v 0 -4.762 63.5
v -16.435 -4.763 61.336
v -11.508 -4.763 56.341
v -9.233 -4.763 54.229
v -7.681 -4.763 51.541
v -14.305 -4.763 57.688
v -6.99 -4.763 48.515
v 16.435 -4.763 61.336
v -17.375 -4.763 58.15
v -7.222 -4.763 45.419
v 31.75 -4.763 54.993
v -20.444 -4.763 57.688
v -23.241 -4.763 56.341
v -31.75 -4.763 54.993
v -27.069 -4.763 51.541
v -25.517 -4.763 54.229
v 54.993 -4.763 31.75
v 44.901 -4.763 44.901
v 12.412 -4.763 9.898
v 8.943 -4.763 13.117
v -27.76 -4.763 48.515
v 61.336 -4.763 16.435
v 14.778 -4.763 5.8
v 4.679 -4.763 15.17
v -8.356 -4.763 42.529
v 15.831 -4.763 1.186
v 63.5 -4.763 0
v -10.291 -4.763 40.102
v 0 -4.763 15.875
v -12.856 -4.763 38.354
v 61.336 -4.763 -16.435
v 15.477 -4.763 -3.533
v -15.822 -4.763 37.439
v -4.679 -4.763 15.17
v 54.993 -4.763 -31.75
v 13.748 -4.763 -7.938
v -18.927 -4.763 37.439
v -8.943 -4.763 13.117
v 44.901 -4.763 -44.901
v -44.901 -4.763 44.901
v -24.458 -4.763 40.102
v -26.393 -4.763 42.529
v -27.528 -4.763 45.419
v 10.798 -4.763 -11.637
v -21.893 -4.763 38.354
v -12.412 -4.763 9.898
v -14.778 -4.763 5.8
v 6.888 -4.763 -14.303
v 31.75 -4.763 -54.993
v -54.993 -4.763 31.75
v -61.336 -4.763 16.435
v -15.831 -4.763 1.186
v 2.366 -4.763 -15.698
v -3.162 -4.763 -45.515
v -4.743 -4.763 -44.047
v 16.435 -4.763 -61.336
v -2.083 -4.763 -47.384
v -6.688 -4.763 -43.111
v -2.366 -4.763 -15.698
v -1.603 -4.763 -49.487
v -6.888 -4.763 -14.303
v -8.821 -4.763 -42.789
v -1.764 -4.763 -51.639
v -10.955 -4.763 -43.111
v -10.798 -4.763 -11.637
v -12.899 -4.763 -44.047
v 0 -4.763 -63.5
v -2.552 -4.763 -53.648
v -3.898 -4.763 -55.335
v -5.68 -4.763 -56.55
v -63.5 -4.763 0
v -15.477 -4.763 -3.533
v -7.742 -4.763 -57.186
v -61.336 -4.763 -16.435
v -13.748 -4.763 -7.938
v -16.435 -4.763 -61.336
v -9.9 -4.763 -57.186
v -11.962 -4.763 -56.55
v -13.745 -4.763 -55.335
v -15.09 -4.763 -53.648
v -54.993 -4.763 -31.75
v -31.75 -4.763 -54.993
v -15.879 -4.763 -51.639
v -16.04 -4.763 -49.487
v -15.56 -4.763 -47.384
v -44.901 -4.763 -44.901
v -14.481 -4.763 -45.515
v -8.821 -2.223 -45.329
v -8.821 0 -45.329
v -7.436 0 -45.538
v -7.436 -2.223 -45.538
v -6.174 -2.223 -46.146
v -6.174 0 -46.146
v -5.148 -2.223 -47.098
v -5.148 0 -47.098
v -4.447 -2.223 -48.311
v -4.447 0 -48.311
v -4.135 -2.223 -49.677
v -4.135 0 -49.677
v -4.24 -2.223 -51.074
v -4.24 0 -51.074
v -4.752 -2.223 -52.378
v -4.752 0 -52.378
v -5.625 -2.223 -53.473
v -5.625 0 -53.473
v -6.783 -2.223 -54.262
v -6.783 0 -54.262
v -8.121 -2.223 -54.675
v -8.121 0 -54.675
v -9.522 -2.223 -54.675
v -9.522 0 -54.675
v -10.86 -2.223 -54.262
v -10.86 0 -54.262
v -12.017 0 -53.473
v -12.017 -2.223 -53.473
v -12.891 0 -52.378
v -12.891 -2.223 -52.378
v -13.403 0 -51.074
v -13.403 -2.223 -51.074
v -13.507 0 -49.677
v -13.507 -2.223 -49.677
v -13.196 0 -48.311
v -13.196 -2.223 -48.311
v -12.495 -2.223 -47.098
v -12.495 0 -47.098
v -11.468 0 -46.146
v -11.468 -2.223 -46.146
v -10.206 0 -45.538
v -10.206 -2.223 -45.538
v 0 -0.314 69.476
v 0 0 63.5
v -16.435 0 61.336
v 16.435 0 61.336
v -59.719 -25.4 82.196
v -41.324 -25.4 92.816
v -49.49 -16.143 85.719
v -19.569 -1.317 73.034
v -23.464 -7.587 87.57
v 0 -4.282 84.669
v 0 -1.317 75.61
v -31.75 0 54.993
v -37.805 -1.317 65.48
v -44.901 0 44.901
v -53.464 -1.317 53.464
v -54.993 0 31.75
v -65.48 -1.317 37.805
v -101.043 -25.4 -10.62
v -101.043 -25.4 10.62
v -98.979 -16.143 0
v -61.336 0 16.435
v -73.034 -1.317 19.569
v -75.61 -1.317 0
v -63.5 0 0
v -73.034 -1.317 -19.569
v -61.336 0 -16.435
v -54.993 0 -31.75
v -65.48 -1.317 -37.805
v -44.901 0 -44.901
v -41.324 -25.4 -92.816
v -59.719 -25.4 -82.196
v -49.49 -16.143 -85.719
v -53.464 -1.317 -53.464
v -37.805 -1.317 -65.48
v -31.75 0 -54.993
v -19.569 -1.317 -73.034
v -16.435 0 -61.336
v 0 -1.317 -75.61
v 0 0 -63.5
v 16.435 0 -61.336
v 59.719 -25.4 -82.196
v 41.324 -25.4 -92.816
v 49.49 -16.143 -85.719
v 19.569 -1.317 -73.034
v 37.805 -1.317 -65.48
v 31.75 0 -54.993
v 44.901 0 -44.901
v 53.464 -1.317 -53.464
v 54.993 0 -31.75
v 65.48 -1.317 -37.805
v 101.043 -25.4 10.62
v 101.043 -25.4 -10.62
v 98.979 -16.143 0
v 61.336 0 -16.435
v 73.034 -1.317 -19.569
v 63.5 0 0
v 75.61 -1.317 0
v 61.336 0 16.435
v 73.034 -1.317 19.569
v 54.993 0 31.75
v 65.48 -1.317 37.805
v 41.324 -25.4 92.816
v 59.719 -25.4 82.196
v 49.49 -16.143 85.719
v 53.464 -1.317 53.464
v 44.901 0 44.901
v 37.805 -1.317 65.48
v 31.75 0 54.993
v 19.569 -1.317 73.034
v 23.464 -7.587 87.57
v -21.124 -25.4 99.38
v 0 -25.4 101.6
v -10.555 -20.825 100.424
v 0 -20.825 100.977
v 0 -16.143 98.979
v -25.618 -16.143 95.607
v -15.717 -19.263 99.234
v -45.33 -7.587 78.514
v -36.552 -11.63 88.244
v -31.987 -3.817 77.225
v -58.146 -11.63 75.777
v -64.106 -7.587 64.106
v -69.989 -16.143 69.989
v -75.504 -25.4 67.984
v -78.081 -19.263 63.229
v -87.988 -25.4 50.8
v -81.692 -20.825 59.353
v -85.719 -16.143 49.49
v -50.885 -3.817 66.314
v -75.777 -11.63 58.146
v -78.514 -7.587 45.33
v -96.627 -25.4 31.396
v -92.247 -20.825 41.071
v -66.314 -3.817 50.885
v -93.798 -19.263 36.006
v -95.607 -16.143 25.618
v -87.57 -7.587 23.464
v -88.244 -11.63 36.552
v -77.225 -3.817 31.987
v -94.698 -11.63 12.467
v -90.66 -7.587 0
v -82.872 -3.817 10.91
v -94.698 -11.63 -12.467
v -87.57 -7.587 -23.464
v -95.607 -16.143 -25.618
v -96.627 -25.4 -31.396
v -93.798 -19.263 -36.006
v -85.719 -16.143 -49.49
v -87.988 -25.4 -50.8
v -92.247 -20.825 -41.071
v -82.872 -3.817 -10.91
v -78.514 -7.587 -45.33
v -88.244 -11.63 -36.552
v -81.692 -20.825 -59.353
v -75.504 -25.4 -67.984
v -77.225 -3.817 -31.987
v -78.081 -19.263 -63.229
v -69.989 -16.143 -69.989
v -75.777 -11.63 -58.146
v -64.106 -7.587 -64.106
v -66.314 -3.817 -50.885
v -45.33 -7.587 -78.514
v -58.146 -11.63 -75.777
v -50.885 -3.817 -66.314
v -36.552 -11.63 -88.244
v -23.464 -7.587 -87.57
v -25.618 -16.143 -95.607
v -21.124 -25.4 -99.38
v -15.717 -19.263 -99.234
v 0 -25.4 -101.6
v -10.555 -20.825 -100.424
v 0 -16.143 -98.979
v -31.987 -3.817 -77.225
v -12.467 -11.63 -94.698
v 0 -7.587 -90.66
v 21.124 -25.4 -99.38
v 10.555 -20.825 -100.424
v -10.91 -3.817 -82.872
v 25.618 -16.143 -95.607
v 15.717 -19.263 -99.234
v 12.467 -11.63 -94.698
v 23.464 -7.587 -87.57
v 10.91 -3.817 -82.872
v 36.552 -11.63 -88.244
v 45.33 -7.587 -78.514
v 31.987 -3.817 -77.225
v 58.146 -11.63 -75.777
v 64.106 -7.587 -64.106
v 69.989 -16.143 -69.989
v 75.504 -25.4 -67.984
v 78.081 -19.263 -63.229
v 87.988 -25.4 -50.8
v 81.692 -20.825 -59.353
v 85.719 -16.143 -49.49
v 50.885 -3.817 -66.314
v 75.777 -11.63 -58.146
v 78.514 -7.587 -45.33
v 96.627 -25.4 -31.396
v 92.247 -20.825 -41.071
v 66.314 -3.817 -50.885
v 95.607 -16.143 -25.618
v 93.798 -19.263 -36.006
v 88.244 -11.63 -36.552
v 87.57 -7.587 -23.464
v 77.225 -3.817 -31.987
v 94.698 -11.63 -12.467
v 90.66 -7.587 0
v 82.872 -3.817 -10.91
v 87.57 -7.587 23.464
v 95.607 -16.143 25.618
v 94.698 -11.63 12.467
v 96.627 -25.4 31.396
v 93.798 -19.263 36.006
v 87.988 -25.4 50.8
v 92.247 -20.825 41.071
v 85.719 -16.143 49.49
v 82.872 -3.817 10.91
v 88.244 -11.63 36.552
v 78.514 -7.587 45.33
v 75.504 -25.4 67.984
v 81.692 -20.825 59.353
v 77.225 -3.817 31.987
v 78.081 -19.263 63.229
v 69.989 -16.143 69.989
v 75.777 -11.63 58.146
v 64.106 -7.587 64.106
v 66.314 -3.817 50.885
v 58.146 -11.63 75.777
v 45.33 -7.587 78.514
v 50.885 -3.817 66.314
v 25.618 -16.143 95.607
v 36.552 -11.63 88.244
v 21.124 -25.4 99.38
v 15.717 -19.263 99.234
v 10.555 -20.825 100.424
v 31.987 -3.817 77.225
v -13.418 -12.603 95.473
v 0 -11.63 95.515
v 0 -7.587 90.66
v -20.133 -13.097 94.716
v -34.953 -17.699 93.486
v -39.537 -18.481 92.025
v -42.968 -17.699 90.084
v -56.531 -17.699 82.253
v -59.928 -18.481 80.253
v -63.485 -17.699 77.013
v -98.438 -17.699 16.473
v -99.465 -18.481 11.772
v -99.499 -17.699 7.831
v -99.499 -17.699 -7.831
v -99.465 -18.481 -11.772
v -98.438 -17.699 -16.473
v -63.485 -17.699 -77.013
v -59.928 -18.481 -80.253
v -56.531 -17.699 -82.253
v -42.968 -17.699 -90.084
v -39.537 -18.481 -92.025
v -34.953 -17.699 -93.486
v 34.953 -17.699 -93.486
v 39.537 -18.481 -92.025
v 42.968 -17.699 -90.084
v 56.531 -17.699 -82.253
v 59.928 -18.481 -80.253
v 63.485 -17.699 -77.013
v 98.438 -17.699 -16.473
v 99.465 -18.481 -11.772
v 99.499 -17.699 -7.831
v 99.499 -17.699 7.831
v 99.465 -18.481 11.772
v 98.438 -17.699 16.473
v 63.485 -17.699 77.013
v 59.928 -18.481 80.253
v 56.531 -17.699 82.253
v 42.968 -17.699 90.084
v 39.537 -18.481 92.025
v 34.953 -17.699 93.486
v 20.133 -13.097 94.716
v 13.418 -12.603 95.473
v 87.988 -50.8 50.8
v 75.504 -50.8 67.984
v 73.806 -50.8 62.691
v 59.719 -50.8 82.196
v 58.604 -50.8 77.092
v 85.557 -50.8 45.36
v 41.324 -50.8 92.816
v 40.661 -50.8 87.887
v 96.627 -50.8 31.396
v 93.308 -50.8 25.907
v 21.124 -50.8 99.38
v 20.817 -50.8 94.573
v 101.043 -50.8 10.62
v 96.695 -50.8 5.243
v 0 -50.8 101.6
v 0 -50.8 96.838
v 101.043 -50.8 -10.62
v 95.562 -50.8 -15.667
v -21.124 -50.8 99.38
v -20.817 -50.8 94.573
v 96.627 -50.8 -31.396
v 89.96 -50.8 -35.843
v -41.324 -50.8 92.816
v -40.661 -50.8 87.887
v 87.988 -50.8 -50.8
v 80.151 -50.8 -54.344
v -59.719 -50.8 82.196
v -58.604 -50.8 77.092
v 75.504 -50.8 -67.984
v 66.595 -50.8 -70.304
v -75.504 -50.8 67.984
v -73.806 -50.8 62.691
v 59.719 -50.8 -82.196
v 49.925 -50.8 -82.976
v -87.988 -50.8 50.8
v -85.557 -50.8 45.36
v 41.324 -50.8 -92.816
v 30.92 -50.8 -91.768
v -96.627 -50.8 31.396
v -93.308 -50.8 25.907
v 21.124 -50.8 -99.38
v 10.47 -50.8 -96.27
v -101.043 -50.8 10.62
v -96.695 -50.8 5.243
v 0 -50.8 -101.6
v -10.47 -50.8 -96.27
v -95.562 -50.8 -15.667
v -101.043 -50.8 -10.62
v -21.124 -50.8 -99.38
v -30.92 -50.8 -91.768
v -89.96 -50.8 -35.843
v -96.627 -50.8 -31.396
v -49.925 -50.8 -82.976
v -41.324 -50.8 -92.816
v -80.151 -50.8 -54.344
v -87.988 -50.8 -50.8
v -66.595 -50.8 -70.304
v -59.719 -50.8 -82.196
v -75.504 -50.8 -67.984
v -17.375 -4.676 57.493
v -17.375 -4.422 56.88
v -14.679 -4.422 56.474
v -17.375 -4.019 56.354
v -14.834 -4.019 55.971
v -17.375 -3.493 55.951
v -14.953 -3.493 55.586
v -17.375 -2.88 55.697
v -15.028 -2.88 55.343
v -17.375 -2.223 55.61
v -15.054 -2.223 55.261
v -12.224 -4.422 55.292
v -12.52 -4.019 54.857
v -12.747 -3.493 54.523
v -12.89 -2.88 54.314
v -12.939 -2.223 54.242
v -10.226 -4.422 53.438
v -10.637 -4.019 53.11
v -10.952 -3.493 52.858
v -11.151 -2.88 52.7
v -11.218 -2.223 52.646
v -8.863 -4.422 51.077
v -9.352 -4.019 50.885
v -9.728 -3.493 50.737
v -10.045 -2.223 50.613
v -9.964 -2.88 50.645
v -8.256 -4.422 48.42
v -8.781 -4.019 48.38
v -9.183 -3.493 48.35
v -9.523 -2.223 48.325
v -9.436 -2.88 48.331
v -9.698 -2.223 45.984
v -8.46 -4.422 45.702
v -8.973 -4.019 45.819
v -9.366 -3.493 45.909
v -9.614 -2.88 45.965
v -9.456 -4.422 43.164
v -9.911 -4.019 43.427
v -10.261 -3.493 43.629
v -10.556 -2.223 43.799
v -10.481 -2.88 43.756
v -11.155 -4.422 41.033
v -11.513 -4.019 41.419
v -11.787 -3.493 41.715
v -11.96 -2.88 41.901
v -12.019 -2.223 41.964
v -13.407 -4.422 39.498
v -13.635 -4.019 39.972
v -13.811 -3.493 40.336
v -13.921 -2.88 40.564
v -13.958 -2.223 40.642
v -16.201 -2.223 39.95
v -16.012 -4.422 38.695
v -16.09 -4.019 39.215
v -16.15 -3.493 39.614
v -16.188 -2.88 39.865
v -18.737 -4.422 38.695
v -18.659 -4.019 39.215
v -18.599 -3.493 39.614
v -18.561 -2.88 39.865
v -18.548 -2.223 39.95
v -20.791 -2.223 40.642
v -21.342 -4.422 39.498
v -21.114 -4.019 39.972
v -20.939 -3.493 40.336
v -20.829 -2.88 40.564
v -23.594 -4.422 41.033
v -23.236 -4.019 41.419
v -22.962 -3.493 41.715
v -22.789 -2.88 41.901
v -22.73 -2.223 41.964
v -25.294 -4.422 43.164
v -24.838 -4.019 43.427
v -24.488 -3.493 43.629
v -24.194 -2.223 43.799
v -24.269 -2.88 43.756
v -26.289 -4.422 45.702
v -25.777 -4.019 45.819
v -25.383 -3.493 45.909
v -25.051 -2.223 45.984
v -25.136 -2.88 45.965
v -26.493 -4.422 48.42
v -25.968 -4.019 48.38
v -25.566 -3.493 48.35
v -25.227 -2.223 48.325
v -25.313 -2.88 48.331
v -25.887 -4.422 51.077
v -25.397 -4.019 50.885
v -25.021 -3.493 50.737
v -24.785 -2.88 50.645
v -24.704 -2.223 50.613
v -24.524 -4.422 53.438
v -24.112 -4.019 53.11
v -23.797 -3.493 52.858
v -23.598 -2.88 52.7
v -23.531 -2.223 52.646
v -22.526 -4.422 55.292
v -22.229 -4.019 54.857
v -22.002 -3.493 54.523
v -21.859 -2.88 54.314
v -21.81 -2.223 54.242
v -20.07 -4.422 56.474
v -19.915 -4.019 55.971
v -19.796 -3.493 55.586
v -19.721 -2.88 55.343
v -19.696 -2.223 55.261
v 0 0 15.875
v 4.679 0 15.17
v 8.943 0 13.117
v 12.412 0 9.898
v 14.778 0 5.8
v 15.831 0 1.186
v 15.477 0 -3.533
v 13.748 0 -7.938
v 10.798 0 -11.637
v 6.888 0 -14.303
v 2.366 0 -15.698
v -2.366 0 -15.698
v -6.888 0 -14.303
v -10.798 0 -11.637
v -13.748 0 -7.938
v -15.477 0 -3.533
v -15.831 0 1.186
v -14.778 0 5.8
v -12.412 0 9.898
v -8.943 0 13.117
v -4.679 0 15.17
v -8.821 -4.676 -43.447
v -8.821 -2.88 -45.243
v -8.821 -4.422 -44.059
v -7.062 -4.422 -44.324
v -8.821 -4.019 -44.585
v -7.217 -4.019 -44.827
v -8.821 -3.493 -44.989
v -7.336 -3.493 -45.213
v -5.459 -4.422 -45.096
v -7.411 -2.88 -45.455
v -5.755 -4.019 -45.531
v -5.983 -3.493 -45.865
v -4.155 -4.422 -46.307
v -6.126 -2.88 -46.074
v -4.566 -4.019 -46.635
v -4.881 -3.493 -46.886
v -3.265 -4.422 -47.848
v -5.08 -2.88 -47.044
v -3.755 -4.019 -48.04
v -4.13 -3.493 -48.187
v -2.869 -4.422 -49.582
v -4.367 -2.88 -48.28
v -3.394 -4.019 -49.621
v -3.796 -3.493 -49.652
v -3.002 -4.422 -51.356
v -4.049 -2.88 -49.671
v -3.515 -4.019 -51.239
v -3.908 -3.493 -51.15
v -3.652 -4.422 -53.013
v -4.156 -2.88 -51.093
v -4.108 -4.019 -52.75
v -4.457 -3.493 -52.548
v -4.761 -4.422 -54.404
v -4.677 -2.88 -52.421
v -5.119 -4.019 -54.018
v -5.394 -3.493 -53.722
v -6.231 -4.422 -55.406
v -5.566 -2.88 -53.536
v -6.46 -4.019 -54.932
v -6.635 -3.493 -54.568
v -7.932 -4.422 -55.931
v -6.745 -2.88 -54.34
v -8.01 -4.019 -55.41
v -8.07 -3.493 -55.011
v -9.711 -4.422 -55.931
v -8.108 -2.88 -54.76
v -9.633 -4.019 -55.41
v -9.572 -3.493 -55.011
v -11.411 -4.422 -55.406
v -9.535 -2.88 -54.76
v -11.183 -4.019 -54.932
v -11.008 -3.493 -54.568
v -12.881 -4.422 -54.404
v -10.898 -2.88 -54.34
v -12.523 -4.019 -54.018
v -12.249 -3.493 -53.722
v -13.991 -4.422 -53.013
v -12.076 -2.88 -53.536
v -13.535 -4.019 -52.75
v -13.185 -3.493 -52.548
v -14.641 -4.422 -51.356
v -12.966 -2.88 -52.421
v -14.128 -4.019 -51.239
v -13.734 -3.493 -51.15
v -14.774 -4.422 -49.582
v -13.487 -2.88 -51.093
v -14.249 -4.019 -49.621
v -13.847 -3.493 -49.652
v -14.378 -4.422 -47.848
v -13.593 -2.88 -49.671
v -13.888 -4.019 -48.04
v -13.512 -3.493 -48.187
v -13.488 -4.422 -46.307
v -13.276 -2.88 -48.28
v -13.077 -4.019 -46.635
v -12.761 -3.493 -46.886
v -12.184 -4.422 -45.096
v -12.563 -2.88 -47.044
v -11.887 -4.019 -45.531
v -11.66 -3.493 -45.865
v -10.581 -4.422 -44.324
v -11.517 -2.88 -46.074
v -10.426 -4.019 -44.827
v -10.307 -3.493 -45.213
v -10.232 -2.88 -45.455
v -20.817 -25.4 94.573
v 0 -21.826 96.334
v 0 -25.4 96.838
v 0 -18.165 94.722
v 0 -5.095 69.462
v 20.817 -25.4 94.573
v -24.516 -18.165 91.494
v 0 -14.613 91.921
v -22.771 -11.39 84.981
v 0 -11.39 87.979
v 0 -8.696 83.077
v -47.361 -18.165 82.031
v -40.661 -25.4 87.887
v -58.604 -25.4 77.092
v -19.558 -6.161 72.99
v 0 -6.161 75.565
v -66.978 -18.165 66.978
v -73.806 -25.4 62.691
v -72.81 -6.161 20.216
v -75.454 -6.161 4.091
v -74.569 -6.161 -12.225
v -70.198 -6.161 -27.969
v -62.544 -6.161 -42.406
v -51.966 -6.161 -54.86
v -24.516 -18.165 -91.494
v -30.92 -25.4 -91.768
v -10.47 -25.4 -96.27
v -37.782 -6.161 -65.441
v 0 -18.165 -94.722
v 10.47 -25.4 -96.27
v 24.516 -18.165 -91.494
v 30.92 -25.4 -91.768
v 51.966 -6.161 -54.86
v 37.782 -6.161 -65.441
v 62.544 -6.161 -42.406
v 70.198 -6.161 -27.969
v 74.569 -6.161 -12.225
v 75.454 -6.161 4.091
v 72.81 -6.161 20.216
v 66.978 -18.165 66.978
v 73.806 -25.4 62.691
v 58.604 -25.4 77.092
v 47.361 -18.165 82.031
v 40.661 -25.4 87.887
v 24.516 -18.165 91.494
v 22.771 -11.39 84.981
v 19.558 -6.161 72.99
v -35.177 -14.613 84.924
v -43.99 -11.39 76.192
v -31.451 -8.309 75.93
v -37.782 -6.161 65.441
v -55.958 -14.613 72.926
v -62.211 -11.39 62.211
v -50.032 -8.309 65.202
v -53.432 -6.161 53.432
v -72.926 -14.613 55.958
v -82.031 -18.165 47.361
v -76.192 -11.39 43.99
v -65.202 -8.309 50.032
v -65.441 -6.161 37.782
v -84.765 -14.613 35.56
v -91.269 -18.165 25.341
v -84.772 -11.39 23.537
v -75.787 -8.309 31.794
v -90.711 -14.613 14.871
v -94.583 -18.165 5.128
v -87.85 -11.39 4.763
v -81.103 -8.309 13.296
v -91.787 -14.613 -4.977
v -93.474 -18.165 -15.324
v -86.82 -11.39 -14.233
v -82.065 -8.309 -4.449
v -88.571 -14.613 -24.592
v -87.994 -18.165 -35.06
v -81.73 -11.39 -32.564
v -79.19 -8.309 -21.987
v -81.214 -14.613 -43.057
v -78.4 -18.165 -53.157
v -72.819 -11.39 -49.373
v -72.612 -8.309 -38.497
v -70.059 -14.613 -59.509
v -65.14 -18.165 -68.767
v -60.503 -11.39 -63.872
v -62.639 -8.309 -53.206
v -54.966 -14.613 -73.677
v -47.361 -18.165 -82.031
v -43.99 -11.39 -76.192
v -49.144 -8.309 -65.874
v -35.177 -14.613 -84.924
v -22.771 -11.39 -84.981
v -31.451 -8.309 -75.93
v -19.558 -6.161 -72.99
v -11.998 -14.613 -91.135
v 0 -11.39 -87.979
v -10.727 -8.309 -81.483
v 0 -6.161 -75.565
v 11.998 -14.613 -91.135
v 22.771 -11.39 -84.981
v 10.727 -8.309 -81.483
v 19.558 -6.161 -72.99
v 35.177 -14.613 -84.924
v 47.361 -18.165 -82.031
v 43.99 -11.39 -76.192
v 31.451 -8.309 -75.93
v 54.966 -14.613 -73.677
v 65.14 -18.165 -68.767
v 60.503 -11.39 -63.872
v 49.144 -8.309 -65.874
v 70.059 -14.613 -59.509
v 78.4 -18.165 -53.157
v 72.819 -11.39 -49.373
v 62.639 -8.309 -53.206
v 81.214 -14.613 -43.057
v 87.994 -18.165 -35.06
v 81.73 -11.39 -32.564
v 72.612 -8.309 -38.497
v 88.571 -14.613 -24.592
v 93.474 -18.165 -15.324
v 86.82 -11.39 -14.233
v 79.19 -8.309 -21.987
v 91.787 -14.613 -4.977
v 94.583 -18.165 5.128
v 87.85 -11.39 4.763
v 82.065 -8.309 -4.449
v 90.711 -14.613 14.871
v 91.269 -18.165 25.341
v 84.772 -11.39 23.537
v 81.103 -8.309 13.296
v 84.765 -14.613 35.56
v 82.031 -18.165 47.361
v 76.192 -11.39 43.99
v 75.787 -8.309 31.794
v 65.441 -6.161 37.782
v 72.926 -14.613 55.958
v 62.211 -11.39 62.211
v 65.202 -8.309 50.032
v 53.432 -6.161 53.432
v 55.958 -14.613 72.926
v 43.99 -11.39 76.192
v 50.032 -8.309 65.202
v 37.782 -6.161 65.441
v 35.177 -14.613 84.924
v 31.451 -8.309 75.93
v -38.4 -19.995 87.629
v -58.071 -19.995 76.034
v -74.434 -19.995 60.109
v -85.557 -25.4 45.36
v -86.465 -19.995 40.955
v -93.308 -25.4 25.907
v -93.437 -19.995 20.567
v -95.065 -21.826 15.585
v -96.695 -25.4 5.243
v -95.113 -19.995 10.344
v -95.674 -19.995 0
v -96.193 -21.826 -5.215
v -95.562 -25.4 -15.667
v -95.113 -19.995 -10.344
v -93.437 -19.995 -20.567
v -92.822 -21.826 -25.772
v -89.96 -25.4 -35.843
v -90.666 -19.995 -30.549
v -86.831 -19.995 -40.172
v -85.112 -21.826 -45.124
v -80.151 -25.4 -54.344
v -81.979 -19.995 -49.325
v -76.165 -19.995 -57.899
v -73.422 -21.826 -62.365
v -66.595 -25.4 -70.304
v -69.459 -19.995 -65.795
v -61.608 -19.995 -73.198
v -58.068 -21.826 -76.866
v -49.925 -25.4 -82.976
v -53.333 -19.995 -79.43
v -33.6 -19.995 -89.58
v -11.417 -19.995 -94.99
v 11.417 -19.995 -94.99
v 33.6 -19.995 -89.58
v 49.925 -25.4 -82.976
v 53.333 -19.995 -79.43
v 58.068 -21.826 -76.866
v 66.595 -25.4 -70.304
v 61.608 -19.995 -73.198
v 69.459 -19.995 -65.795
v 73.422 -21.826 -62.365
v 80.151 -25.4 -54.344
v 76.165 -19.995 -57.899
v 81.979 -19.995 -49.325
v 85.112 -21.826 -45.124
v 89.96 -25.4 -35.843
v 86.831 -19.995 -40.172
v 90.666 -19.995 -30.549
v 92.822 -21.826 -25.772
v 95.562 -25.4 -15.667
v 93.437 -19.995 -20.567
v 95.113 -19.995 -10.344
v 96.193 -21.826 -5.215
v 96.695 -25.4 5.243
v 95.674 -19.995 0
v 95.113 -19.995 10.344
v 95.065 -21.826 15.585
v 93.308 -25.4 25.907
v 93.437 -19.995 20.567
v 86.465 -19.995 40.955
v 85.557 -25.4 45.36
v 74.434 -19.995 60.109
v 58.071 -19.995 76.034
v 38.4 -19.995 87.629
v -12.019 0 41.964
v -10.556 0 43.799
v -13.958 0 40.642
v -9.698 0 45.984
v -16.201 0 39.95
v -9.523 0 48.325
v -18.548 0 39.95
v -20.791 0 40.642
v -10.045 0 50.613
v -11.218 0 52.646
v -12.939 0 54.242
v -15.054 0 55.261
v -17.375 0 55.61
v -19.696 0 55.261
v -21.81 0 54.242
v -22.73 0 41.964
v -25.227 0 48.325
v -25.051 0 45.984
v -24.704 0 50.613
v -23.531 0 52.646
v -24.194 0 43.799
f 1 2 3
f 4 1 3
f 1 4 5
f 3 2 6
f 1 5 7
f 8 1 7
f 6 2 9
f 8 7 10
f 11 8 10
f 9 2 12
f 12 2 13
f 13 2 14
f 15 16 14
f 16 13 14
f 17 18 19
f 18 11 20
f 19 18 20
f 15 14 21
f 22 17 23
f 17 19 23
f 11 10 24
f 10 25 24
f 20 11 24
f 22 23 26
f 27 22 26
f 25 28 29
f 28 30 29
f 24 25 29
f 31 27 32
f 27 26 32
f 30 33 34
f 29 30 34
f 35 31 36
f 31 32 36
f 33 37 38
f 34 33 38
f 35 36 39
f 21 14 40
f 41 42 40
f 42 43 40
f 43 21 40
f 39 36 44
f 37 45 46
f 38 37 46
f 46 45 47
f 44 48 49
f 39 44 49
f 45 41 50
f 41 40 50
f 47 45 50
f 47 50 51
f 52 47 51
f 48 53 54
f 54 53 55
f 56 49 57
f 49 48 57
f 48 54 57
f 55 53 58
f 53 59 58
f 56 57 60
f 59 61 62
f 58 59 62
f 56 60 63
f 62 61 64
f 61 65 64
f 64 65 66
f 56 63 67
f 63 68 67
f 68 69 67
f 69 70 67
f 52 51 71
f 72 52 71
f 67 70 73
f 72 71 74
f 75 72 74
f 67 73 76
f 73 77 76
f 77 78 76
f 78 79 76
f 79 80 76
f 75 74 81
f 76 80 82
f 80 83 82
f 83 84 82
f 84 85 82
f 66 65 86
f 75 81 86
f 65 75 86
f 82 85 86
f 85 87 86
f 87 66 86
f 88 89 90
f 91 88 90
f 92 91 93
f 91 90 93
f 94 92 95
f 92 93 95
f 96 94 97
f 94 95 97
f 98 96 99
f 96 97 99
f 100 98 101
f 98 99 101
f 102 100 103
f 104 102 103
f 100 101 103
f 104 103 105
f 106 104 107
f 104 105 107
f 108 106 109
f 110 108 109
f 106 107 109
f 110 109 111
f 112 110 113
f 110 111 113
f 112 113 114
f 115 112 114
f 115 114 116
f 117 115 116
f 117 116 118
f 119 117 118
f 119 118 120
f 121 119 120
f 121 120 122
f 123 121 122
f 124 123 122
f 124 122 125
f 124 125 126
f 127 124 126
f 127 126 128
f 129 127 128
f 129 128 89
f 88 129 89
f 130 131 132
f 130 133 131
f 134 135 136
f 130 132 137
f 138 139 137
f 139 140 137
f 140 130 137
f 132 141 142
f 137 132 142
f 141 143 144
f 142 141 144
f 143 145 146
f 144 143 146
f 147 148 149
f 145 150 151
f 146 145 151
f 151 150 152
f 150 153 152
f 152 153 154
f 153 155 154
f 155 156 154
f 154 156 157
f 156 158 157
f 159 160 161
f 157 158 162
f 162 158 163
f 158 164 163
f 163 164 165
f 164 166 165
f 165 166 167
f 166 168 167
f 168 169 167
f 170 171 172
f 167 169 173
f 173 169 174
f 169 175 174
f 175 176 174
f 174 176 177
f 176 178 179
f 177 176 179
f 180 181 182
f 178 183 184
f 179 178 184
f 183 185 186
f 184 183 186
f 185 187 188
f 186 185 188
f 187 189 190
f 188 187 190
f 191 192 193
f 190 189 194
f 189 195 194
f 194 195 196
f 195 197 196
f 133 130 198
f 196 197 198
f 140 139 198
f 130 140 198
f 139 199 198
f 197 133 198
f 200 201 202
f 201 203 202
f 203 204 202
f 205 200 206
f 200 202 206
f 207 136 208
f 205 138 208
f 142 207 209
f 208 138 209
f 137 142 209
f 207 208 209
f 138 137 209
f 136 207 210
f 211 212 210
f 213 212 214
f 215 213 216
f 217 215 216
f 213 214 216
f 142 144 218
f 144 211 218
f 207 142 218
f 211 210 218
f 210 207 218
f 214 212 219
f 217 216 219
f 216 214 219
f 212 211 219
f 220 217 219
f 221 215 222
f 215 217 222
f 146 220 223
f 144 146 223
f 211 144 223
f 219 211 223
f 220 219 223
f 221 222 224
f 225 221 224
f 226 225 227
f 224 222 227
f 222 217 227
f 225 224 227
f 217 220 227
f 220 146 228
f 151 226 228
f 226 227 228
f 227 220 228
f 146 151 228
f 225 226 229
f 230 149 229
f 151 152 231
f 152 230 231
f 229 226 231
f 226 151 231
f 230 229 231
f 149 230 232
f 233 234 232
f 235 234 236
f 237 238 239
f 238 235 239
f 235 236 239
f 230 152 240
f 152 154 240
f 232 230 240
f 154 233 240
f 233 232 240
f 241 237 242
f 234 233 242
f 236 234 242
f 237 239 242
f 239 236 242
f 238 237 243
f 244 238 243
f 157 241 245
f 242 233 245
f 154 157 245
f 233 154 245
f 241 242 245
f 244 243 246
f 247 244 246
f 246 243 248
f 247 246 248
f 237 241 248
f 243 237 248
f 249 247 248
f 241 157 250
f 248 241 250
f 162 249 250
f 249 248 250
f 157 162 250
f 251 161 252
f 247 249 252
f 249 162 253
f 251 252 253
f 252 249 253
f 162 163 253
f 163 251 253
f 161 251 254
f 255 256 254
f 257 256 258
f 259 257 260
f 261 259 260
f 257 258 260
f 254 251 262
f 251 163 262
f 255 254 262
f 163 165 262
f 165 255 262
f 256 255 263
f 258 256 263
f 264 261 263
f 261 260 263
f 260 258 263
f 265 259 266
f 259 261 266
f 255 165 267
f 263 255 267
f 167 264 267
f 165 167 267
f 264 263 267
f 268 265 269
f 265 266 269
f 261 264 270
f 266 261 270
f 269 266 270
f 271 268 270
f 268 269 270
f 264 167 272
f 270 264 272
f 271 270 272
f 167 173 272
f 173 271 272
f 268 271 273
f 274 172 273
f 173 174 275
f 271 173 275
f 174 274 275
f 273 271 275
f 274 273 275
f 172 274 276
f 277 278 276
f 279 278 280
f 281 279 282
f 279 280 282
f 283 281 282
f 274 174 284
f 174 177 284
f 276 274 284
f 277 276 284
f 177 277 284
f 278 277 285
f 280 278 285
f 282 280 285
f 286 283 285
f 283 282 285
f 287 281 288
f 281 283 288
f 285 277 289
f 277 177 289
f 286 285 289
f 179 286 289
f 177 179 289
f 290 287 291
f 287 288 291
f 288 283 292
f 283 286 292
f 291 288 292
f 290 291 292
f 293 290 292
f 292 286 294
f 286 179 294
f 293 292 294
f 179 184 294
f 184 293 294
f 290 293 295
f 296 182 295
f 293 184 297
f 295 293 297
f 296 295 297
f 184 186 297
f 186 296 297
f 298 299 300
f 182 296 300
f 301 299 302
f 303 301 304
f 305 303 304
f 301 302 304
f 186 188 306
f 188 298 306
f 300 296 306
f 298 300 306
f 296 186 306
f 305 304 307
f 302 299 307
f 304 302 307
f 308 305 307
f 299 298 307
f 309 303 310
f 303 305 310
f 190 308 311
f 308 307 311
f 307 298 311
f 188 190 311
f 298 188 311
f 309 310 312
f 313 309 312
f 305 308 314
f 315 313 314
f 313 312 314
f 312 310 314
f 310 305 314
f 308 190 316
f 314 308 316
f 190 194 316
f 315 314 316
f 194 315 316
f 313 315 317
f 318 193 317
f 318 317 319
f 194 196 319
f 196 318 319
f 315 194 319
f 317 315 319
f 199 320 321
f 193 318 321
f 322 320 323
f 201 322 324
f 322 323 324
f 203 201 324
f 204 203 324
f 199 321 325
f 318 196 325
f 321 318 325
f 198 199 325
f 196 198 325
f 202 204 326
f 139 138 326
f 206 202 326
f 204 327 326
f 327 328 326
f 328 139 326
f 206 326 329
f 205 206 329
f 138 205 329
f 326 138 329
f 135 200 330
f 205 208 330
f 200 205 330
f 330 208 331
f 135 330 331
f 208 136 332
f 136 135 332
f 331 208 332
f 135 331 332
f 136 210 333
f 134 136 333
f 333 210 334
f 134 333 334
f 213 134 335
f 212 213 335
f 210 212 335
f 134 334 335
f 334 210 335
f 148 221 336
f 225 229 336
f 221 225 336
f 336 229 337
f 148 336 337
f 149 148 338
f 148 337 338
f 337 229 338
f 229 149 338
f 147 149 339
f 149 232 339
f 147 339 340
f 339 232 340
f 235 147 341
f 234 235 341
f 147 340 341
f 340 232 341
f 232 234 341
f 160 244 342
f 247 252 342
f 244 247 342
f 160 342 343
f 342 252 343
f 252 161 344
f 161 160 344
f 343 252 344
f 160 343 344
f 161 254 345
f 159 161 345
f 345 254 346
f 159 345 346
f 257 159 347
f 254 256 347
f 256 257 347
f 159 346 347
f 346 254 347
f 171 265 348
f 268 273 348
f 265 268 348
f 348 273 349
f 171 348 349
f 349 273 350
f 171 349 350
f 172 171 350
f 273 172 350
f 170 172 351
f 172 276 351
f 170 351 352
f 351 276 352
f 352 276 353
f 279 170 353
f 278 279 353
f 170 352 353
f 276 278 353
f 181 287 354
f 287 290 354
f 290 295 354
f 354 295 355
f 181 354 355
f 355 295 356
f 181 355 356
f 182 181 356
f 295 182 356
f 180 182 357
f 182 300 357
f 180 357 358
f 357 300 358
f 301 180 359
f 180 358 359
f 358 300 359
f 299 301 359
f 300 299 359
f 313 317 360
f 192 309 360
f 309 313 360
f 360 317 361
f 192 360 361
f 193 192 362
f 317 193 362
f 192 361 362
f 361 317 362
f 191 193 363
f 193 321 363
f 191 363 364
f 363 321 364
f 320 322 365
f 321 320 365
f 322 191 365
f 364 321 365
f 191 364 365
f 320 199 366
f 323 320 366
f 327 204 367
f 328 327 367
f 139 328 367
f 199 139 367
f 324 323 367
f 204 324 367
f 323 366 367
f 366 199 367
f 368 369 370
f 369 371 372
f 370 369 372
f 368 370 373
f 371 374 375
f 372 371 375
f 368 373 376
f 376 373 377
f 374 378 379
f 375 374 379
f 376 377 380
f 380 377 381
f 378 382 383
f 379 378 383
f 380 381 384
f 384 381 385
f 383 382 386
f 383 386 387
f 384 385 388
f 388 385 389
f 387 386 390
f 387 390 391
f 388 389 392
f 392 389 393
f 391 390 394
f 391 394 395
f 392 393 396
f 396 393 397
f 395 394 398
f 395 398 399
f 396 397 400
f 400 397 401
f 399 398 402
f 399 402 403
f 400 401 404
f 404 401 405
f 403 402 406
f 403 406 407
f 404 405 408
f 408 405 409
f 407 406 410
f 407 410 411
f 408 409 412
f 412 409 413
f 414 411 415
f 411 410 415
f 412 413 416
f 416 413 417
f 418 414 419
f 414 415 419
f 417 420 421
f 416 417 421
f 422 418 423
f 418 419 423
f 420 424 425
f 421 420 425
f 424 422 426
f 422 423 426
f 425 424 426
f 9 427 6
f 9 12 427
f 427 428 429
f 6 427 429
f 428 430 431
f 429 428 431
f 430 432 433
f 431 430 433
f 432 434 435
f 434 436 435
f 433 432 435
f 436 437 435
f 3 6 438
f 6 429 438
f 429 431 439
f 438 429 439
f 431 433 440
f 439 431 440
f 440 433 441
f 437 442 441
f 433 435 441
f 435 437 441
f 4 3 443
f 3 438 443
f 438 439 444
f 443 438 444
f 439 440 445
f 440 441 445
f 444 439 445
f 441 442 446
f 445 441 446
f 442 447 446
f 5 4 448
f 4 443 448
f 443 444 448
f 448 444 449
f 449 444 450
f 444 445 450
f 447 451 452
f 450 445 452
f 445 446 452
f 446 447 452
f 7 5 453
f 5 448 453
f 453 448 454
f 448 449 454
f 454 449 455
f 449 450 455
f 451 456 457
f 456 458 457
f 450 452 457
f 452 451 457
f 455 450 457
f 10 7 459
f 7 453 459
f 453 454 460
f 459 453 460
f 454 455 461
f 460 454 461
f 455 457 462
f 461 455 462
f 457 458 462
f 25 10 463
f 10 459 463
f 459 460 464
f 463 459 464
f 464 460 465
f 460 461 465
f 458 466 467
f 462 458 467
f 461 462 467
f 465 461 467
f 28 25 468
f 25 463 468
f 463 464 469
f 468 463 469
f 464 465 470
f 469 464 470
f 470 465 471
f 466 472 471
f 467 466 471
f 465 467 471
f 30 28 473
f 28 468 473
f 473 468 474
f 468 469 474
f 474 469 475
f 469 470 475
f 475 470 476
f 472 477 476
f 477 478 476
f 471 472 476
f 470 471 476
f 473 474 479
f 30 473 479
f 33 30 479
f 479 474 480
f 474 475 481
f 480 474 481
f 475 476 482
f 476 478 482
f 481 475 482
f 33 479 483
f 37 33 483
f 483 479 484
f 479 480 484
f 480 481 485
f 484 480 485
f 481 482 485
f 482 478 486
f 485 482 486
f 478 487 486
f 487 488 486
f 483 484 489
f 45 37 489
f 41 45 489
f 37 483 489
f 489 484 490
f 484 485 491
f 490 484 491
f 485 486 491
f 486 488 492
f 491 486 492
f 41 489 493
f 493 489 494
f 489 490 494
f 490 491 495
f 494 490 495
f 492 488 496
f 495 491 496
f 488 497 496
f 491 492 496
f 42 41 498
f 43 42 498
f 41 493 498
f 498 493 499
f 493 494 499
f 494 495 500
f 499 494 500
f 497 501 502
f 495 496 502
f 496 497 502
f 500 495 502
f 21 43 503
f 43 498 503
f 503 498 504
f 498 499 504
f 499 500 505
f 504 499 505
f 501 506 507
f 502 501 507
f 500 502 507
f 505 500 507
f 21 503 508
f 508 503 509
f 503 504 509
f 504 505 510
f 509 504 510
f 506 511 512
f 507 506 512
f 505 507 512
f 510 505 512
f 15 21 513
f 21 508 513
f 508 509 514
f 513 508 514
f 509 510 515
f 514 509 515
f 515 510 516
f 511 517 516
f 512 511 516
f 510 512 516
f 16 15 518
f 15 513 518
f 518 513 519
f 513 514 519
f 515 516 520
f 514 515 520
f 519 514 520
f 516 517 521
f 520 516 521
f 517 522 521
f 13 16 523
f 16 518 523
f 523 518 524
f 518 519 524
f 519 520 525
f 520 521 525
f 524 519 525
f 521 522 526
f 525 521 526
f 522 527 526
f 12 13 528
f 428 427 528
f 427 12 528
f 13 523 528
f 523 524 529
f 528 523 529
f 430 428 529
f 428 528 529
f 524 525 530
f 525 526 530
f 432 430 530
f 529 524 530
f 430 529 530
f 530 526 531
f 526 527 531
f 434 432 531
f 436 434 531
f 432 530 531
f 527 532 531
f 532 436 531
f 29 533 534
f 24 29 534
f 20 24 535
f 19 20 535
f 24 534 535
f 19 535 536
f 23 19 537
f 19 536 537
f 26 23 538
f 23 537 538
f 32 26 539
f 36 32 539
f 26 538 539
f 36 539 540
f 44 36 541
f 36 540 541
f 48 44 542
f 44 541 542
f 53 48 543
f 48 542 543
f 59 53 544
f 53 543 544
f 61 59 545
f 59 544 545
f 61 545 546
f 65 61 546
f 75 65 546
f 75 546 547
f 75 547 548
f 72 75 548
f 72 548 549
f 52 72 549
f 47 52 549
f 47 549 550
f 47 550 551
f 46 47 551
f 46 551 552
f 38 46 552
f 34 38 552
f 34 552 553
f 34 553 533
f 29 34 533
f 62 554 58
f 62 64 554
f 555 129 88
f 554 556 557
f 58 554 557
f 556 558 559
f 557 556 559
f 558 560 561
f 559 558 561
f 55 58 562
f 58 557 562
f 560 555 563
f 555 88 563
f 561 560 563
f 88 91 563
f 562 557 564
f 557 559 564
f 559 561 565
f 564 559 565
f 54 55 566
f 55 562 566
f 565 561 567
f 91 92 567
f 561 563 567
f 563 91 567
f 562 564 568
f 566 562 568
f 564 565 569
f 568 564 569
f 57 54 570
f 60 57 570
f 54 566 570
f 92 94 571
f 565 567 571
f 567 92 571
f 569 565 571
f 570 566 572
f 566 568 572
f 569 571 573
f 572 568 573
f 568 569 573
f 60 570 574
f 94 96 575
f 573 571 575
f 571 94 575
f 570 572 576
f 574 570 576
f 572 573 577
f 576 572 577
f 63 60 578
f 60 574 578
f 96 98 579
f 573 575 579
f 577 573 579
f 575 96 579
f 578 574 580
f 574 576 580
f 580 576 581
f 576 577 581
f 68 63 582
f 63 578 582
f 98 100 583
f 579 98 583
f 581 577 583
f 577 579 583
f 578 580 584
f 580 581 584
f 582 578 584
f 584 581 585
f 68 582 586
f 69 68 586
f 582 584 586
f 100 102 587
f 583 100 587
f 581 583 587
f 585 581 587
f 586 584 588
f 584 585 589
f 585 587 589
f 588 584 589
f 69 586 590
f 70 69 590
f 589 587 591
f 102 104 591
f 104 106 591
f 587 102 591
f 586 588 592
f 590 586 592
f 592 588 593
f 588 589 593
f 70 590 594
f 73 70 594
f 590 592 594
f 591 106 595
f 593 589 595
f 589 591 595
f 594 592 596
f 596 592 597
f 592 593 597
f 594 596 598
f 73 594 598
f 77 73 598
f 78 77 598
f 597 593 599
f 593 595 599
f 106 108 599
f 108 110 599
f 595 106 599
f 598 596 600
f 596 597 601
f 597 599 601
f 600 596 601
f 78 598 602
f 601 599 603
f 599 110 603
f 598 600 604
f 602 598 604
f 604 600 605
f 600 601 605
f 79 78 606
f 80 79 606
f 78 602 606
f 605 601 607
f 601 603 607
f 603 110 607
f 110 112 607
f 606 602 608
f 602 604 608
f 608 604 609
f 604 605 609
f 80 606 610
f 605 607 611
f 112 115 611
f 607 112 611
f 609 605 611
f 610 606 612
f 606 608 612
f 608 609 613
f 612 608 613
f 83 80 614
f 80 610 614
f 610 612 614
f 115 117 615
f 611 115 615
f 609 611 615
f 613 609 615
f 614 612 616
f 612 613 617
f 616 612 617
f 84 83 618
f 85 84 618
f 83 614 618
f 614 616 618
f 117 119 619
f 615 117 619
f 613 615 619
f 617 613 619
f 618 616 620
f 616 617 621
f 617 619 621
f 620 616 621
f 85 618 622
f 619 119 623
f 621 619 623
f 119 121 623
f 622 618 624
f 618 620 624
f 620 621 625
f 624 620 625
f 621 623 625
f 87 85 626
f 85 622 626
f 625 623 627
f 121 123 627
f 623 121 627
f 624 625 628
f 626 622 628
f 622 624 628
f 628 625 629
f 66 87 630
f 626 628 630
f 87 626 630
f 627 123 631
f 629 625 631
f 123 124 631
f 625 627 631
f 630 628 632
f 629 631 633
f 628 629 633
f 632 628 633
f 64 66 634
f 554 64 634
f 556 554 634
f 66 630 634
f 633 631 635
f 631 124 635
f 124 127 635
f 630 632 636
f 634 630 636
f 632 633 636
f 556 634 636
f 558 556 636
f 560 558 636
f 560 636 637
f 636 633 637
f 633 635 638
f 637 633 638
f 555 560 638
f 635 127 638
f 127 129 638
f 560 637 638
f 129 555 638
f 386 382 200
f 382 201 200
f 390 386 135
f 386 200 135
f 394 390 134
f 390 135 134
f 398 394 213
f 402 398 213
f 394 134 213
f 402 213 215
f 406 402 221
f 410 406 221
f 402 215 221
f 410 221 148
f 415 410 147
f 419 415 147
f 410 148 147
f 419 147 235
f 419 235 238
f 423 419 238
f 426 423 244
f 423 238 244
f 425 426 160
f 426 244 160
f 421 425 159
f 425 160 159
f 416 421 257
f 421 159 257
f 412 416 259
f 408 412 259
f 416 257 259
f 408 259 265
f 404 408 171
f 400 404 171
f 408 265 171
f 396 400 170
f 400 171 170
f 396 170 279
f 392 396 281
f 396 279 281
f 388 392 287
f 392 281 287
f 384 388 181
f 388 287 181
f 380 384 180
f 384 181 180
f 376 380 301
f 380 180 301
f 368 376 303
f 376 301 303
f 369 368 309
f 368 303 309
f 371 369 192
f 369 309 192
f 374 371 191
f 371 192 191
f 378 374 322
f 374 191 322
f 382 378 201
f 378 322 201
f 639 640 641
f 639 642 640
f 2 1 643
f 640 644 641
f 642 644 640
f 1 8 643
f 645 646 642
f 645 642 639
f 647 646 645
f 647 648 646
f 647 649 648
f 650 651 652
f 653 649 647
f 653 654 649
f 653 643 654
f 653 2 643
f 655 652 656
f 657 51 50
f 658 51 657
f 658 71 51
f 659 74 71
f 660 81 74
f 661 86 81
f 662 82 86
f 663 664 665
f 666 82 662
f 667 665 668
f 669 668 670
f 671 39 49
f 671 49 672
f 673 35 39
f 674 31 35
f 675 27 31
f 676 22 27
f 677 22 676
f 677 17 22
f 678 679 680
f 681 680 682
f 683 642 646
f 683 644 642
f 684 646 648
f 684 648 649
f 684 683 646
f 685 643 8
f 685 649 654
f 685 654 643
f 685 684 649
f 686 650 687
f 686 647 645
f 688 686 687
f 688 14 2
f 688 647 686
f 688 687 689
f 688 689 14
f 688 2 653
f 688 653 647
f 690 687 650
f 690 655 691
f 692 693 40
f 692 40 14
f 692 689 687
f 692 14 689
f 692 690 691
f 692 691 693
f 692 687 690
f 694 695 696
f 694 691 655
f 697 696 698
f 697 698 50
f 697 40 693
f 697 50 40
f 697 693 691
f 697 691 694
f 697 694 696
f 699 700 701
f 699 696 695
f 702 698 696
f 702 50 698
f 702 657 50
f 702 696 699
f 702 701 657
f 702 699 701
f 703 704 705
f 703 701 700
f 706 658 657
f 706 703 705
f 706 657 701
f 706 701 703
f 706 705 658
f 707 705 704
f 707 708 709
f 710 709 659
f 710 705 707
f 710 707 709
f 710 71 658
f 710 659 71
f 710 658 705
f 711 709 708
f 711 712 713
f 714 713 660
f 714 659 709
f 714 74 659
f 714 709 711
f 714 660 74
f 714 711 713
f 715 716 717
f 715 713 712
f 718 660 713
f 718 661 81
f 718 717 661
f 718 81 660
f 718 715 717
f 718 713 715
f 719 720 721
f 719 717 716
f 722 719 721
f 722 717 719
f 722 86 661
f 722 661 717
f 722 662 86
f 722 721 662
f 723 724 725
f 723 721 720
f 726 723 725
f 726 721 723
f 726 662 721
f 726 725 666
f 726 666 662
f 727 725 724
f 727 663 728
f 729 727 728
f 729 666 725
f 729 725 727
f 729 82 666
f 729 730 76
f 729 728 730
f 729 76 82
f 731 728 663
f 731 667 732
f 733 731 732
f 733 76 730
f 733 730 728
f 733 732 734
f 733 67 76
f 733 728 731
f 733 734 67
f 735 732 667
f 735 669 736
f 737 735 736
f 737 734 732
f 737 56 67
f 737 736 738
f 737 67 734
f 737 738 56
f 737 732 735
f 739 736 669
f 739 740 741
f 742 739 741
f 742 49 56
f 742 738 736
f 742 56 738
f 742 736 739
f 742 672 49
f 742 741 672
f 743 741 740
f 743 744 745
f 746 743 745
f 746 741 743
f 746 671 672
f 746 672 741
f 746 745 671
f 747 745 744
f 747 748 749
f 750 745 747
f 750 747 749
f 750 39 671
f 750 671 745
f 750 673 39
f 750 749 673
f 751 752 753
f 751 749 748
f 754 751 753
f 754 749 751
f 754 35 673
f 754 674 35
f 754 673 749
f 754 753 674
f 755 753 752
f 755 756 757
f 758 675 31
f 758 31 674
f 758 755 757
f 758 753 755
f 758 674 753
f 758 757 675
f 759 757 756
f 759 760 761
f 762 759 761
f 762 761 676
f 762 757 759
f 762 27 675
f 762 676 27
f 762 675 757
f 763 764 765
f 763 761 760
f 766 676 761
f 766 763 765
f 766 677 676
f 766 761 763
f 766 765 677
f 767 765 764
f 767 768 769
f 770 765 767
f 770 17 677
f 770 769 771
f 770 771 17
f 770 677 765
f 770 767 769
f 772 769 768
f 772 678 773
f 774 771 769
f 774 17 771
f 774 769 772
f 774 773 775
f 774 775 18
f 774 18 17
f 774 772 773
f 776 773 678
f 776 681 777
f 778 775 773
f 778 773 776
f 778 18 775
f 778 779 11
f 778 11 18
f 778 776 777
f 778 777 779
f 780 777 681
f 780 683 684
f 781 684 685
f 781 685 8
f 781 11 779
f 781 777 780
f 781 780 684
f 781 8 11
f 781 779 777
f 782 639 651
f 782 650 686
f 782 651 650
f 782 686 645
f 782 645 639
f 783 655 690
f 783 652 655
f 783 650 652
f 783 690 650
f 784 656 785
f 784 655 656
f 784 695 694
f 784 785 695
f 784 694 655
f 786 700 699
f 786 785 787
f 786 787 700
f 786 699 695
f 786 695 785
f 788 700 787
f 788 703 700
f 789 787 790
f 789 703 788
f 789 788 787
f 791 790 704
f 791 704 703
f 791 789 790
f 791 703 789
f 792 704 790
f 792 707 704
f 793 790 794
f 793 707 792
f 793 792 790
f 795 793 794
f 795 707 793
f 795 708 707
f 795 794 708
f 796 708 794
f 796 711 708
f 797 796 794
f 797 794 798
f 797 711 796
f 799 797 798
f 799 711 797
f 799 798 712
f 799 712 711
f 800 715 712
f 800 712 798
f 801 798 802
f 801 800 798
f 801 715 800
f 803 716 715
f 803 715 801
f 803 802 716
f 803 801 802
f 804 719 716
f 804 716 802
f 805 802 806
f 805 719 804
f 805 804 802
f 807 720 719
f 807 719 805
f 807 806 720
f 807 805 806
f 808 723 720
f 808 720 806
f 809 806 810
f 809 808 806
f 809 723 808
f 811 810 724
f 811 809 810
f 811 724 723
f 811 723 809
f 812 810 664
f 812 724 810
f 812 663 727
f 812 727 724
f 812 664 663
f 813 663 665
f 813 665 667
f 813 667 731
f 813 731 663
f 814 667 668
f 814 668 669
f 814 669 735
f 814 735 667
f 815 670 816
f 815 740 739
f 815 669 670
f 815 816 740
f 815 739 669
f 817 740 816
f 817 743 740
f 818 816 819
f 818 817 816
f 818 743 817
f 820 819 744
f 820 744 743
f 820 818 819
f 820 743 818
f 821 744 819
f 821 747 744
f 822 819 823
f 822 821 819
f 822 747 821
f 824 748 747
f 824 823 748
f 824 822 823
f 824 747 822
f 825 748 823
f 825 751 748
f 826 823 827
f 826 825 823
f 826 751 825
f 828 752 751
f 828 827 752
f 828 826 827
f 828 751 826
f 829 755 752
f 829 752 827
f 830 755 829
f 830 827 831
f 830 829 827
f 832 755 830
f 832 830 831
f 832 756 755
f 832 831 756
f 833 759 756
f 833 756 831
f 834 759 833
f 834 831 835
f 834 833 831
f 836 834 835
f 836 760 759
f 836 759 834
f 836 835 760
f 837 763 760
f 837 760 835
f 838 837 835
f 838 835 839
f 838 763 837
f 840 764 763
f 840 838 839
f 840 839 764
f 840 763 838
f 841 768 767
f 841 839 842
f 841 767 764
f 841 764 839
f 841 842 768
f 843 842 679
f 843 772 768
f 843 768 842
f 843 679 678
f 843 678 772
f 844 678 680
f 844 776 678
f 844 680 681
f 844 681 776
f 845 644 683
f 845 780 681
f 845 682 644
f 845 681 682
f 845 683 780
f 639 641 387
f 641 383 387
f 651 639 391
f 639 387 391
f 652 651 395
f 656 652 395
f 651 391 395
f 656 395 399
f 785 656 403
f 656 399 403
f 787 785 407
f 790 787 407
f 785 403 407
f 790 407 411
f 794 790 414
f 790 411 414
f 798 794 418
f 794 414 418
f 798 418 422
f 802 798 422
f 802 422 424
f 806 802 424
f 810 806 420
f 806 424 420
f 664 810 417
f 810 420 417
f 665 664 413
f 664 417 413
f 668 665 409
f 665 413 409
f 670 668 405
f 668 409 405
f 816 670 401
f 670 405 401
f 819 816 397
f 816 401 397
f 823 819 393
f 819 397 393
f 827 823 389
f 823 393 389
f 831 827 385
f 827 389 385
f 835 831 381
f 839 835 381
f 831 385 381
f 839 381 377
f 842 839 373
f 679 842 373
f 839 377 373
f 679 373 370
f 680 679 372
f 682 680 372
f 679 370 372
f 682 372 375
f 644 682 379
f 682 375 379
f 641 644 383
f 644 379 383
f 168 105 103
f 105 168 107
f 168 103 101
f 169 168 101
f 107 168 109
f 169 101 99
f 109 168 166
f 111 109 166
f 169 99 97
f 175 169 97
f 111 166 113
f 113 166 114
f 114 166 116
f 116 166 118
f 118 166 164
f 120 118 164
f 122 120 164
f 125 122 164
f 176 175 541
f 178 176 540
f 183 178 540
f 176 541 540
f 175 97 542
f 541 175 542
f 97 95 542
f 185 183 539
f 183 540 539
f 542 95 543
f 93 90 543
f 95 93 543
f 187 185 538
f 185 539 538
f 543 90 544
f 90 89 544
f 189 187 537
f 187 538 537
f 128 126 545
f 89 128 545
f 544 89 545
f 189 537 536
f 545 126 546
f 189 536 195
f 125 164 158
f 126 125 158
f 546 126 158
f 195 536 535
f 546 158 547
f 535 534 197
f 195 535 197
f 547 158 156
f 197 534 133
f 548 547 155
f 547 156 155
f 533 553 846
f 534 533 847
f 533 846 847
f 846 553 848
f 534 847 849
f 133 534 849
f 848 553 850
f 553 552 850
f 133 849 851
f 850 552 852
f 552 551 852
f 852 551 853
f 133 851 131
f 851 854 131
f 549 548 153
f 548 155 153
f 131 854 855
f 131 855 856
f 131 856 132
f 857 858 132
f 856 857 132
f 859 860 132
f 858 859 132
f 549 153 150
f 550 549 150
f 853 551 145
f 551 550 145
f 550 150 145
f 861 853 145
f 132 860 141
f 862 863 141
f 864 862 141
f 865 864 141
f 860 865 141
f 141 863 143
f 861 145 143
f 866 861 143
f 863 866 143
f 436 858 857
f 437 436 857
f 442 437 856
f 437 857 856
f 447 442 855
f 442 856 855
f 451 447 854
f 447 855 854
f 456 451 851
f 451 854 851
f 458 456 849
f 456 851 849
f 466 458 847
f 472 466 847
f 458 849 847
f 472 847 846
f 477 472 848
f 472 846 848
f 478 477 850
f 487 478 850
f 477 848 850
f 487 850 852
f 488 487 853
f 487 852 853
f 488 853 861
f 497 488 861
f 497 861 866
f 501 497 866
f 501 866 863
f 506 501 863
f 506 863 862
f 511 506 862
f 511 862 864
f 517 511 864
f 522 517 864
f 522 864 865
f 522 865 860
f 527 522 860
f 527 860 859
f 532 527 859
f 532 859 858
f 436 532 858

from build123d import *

# Parameters (mm, degrees)
SKETCH2_R          = 7.874
SKETCH2_R_2        = 15.875
SKETCH2_R_3        = 4.699
CUT_EXTRUDE1_DEPTH = 25.4
FILLET1_R          = 2.54


with BuildPart() as part:
    # Sketch1 → Revolve1 (revolve)
    with BuildSketch(Plane.XY, mode=Mode.PRIVATE) as revolve1_sk:
        with BuildLine():
            Line((0, 0), (0, -4.7625))
            Line((0, -4.7625), (63.5, -4.7625))
            add(Edge.make_bspline(
                [(96.8375, -25.4), (96.8375, -4.7625), (63.5, -4.7625)],
                knots=[0, 0, 0, 1.570796327, 1.570796327, 1.570796327], degree=2, weights=[1, 0.707106781, 1]))
            Line((96.8375, -25.4), (96.8375, -50.8))
            Line((96.8375, -50.8), (101.6, -50.8))
            Line((101.6, -50.8), (101.6, -25.4))
            add(Edge.make_bspline(
                [(101.6, -25.4), (101.6, 0), (63.5, 0)],
                knots=[3.141592654, 3.141592654, 3.141592654, 4.71238898, 4.71238898, 4.71238898], degree=2, weights=[1, 0.707106781, 1]))
            Line((63.5, 0), (0, 0))
        make_face()
    revolve(revolve1_sk.sketch.rotate(Axis((0, 29.511089747, 0), (0, -1, 0)), 90), axis=Axis((0, 29.511089747, 0), (0, -1, 0)))

    # Sketch2 → Cut-Extrude1 (cut)
    with BuildSketch(Plane(origin=(0, 0, 0), x_dir=(1, 0, 0), z_dir=(0, 1, 0))):
        with Locations(Location((-17.374623281, -47.736385136, 0), (0, 0, 270))):
            Circle(SKETCH2_R)
        with Locations(Location((0, 0, 0), (0, 0, 270))):
            Circle(SKETCH2_R_2)
        with Locations(Location((-8.821327425, 50.028233853, 0), (0, 0, 270))):
            Circle(SKETCH2_R_3)
    extrude(amount=-CUT_EXTRUDE1_DEPTH, mode=Mode.SUBTRACT)

    # Fillet1
    fillet1_edges = [part.edges().sort_by_distance(p)[0] for p in [
        (-17.374623281, -4.7625, 39.862385136),
        (-8.821327425, -4.7625, -54.727233853),
    ]]
    fillet(fillet1_edges, radius=FILLET1_R)


solid = part.part
